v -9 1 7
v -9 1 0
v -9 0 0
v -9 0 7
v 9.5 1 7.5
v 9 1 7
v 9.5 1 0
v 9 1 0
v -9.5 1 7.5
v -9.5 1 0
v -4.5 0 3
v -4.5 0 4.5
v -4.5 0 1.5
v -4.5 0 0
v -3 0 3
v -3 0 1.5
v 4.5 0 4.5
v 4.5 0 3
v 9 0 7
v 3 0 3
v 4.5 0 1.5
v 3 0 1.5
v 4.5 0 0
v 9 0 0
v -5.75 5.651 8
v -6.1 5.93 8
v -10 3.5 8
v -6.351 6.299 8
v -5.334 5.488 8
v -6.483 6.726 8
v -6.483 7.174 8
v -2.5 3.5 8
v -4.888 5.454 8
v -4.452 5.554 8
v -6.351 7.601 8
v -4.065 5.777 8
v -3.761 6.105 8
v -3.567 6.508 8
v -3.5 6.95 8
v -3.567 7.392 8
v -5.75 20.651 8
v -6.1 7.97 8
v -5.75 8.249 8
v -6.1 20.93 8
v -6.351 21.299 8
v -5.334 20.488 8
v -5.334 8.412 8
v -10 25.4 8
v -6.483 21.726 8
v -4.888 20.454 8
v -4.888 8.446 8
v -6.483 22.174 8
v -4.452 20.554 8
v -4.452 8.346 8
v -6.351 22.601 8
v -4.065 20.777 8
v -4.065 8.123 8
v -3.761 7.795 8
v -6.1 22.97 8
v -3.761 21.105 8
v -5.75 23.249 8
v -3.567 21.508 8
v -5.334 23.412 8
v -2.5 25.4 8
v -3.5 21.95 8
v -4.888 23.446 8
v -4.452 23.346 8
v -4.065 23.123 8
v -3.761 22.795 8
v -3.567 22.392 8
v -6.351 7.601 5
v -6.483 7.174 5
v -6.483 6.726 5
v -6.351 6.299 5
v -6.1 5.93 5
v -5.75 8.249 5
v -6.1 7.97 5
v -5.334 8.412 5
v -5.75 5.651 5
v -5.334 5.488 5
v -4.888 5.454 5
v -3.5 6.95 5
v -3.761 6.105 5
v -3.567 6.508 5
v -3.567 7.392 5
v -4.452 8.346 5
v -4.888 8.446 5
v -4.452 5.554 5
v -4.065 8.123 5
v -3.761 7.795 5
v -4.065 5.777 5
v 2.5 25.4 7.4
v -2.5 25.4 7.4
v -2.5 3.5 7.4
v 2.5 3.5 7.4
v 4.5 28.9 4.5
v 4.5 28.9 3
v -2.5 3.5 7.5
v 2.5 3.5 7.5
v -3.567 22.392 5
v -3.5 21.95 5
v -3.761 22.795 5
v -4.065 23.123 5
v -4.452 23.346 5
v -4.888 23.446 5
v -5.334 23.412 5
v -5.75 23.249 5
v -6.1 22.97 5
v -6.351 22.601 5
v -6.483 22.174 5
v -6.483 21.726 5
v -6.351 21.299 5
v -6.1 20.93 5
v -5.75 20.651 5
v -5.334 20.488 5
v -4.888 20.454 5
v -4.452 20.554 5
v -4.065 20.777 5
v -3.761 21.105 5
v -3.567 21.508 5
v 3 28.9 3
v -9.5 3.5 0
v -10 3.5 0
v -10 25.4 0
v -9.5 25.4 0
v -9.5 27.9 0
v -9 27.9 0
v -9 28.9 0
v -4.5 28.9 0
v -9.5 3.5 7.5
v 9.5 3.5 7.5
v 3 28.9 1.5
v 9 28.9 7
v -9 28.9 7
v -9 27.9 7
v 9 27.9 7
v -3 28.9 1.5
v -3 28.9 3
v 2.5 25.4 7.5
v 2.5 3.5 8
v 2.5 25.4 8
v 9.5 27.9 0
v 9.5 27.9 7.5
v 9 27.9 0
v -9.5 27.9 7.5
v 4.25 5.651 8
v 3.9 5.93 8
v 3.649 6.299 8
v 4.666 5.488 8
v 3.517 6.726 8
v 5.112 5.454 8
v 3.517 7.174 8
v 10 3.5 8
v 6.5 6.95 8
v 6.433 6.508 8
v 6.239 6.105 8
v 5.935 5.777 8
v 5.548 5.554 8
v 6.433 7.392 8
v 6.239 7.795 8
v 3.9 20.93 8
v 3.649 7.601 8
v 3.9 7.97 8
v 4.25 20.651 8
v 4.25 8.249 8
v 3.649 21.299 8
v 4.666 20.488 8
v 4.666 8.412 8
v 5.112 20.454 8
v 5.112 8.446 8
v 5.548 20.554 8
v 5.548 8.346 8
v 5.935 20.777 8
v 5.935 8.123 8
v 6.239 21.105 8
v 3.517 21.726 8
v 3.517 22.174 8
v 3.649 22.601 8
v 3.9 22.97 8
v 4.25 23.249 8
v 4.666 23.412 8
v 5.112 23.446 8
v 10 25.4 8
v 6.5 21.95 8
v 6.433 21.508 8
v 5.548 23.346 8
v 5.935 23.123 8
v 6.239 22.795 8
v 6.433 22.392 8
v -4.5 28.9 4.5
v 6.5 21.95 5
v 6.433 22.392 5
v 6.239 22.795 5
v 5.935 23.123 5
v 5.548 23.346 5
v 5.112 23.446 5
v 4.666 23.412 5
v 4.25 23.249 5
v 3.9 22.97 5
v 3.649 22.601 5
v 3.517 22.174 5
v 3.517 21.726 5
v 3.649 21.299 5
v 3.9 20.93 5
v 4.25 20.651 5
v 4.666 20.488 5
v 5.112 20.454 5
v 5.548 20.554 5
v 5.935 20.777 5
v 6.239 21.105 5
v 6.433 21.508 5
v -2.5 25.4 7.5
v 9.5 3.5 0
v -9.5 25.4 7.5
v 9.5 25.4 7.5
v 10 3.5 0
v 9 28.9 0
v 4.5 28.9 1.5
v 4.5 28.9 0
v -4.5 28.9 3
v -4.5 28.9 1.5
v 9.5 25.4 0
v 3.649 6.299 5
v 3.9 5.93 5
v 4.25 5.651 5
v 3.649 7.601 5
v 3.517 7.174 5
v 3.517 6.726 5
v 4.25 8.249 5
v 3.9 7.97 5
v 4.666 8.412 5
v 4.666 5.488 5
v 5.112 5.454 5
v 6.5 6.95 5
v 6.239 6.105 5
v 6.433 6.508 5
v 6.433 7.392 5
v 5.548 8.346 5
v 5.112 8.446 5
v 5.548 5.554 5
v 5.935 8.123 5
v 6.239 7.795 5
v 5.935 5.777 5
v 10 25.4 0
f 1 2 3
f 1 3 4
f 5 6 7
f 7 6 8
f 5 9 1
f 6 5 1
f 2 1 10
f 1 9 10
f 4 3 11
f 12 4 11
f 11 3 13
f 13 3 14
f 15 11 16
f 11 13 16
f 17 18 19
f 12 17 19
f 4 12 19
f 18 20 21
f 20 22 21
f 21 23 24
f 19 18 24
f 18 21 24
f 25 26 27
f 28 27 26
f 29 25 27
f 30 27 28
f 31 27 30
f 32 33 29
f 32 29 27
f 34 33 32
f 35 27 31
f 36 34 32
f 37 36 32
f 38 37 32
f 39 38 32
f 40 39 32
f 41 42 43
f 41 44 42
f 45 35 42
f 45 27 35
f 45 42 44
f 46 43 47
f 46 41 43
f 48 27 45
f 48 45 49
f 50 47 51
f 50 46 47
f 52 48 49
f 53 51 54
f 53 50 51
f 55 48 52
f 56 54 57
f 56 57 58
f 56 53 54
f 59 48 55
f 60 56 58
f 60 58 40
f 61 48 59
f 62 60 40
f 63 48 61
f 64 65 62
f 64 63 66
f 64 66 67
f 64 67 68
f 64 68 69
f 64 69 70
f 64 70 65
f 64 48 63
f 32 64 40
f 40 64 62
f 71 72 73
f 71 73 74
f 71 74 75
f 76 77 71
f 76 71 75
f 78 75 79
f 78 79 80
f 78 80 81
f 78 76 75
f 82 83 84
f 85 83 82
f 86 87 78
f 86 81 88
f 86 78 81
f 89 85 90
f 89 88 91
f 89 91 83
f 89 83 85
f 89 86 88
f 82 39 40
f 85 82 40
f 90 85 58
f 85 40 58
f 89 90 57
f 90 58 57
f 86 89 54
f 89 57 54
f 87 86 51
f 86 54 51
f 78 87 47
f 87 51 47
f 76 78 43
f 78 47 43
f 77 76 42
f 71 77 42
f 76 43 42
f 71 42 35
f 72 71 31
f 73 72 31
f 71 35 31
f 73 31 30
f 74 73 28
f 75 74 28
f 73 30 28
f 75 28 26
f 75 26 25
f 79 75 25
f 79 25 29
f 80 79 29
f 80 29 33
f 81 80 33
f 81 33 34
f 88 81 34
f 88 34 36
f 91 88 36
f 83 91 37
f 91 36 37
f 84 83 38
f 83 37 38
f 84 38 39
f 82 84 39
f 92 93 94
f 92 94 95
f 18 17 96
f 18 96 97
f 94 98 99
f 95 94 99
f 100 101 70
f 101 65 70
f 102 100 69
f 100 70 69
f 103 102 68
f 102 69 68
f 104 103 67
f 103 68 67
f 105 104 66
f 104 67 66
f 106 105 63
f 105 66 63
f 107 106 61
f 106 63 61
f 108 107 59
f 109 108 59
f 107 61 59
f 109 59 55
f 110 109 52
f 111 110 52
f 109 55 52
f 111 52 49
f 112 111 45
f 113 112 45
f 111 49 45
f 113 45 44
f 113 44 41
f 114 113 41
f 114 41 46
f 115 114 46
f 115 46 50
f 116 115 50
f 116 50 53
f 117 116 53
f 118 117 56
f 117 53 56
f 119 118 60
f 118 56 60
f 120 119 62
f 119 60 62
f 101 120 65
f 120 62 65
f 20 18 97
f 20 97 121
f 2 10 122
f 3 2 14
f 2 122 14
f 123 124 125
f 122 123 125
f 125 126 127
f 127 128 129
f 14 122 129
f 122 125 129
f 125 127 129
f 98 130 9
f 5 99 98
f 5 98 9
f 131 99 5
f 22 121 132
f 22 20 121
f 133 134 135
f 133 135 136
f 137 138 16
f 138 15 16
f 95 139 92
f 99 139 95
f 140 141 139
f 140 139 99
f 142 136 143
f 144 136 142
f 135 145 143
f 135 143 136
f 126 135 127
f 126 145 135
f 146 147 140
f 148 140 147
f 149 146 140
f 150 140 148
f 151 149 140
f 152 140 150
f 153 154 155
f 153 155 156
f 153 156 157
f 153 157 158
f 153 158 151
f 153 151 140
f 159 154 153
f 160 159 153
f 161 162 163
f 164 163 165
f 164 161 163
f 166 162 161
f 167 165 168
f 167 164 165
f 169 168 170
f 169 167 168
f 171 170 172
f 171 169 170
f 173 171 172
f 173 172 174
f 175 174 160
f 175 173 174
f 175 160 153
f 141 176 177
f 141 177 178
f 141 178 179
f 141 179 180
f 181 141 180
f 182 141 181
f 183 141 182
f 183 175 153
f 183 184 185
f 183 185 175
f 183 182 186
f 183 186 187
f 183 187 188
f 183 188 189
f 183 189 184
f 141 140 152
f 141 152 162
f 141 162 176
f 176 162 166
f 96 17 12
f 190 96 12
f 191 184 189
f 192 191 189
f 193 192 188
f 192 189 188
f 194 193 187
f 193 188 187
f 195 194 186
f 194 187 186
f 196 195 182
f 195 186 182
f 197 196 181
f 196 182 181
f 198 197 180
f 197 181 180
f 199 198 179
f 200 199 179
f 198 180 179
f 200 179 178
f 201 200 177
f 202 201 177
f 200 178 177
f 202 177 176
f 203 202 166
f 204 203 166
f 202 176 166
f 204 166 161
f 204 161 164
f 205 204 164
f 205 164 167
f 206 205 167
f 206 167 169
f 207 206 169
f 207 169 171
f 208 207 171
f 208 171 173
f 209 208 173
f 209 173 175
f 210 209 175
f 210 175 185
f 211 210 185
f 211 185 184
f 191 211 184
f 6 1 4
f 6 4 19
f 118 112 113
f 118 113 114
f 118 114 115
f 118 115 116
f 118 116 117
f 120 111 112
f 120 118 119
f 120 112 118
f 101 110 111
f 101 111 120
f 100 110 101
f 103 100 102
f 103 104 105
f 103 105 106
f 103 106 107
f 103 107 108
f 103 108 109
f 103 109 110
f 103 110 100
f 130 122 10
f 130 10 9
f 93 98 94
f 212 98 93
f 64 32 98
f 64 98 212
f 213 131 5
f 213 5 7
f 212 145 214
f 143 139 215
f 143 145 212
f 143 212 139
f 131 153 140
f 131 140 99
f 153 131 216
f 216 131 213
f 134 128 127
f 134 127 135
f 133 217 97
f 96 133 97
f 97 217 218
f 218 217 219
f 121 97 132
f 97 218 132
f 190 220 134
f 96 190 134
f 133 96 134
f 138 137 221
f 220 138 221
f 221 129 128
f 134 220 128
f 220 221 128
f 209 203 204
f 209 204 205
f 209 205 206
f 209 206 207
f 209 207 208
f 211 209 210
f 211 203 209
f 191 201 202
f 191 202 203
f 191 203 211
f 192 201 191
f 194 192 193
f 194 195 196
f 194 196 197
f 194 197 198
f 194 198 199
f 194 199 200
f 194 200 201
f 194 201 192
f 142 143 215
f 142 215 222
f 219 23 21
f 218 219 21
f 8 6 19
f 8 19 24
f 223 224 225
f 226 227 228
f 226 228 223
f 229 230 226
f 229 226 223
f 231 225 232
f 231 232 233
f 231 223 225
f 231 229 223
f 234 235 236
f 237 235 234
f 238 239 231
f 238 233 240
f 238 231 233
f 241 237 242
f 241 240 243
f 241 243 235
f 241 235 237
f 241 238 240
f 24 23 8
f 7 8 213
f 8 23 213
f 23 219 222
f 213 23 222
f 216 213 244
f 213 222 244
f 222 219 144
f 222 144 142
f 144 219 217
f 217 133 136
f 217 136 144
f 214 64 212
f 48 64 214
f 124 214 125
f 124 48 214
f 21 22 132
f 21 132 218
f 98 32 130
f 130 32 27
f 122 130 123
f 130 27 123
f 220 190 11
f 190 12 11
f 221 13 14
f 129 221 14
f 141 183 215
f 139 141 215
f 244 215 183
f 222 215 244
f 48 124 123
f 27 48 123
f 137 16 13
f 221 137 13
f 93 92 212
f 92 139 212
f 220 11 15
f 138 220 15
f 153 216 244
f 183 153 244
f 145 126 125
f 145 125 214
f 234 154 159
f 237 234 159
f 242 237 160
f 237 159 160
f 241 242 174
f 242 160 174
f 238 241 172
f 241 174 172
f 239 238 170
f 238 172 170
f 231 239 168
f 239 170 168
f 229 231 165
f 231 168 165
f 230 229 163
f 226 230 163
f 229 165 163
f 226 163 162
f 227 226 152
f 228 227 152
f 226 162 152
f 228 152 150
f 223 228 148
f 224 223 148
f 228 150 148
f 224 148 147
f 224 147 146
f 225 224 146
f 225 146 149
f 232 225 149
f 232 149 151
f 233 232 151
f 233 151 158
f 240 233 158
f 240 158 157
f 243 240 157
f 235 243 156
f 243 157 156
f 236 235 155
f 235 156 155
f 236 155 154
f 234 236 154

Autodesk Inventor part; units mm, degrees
ref_plane "YZ Plane" through (0, 0, 0) normal (1, 0, 0) x (0, 1, 0)
ref_plane "XZ Plane" through (0, 0, 0) normal (0, 1, 0) x (-1, 0, 0)
ref_plane "XY Plane" through (0, 0, 0) normal (0, 0, 1) x (1, 0, 0)
sketch "Szkic1" plane through (0, 0, 0) normal (0, 0, 1) x (1, 0, 0)
  line L0 (0, 0) -> (10, 0)
  line L1 (10, 0) -> (10, 28.9)
  line L2 (10, 28.9) -> (-10, 28.9)
  line L3 (-10, 28.9) -> (-10, 0)
  line L4 (-10, 0) -> (10, 0)
  dimension "d1" = 28.9
  dimension "d2" = 20
extrude "Wyciągnięcie proste1" add sketch "Szkic1" along normal blind 8
sketch "Szkic2" plane through (-10, 0, 0) normal (0, -1, 0) x (1, 0, 0)
  line L0 (0, 0) -> (20, 0)
  line L1 (20, 0) -> (20, 8)
  line L2 (0, 8) -> (20, 8)
  line L3 (0, 0) -> (0, 8)
  line L4 (14.5, 4.5) -> (5.5, 4.5)
  line L5 (14.5, 4.5) -> (14.5, 3)
  line L6 (14.5, 3) -> (13, 3)
  line L7 (13, 3) -> (13, 1.5)
  line L8 (13, 1.5) -> (14.5, 1.5)
  line L9 (5.5, 4.5) -> (5.5, 3)
  line L10 (5.5, 3) -> (7, 3)
  line L11 (7, 3) -> (7, 1.5)
  line L12 (7, 1.5) -> (5.5, 1.5)
  line L13 (5.5, 4.5) -> (5.5, 3)
  line L14 (5.5, 1.5) -> (5.5, 0)
  line L15 (14.5, 0) -> (14.5, 1.5)
  line L16 (14.5, 3) -> (14.5, 4.5)
extrude "Wyciągnięcie proste2" cut sketch "Szkic2" against normal up to next contours L14 L12 L11 L10 L9 L4 L5 L6 L7 L8 L15 L0
sketch "Szkic3" plane through (0, 0, 8) normal (0, 0, 1) x (1, 0, 0)
  line L0 (10, 0) -> (10, 28.9)
  line L1 (10, 28.9) -> (-10, 28.9)
  line L2 (-10, 28.9) -> (-10, 0)
  line L3 (-10, 0) -> (10, 0)
  line L4 (10, 28.9) -> (-10, 0)
  line L5 (10, 28.9) -> (-10, 28.9)
  line L6 (10, 0) -> (-10, 28.9)
  line L7 (-10, 28.9) -> (0, 14.45)
  line L8 (0, 14.45) -> (0, 6.95)
  line L9 (0, 6.95) -> (5, 6.95)
  line L10 (5, 6.95) -> (5, 21.95)
  line L11 (3, 0) -> (3, 28.9)
  line L12 (5, 21.95) -> (-5, 21.95)
  line L13 (-5, 21.95) -> (-5, 6.95)
  line L14 (-5, 6.95) -> (0, 6.95)
  line L15 (-3, 0) -> (-3, 28.9)
  circle A0 centre (5, 21.95) radius 1.5
  circle A1 centre (5, 6.95) radius 1.5
  circle A2 centre (-5, 21.95) radius 1.5
  circle A3 centre (-5, 6.95) radius 1.5
  point P0 (0, 0)
  dimension "d23" = 10
  dimension "d24" = 15
  dimension "d25" = 3
  dimension "d26" = 3
  dimension "d27" = 3
  dimension "d28" = 3
extrude "Wyciągnięcie proste3" cut sketch "Szkic3" against normal blind 3 contours A1 L9 L10 L6 | L6 L10 A1 | A0 L10 L4 | L4 L10 L12 A0 | L10 L9 A1 L6 | L6 A1 L10 | L10 A0 L4 | L4 A0 L12 L10 | A3 L13 L4 | L4 L13 L14 A3 | L14 L13 L4 A3 | A2 L12 L13 L6 | L6 L13 A2 | A2 L6 L13 L12 | L13 A3 L4 | L6 A2 L13
thread "Gwint1" size "M3x0.5" class "6H" standard "ANSI Metric M Profile" full length
thread "Gwint2" size "M3x0.5" class "6H" standard "ANSI Metric M Profile" full length
thread "Gwint3" size "M3x0.5" class "6H" standard "ANSI Metric M Profile" full length
thread "Gwint4" size "M3x0.5" class "6H" standard "ANSI Metric M Profile" full length
sketch "Szkic4" plane through (0, 0, 8) normal (0, 0, 1) x (1, 0, 0)
  circle A0 centre (-5, 6.95) radius 1.5
  circle A1 centre (5, 6.95) radius 1.5
  circle A2 centre (5, 21.95) radius 1.5
  circle A3 centre (-5, 21.95) radius 1.5
  line L0 (10, 28.9) -> (-10, 28.9)
  line L1 (-10, 0) -> (10, 0)
  line L2 (-10, 0) -> (-10, 1)
  line L3 (-10, 1) -> (10, 1)
  line L4 (-10, 28.9) -> (-10, 27.9)
  line L5 (-10, 27.9) -> (10, 27.9)
  line L6 (-10, 28.9) -> (-10, 27.9)
  line L7 (-10, 1) -> (-10, 0)
  line L8 (10, 0) -> (10, 1)
  line L9 (10, 27.9) -> (10, 28.9)
  line L10 (10, 0) -> (10, 1)
  line L11 (10, 27.9) -> (10, 28.9)
  line L12 (-10, 28.9) -> (-10, 27.9)
  line L13 (-10, 1) -> (-10, 0)
  point P0 (0, 0)
  dimension "d39" = 1
  dimension "d40" = 1
extrude "Wyciągnięcie proste4" cut sketch "Szkic4" against normal blind 1 contours L9 L5 L4 L0 | L2 L3 L8 L1
sketch "Szkic5" plane through (10, 0, 0) normal (1, 0, 0) x (0, 0, -1)
  line L0 (-7, 1) -> (-7, 0) projected
  line L1 (0, 0) -> (-7, 0) projected
  line L2 (0, 0) -> (0, 28.9) projected
  line L3 (-7, 28.9) -> (-7, 27.9) projected
  line L4 (0, 28.9) -> (-7, 28.9) projected
  line L5 (-7, 1) -> (0, 1)
  line L6 (-7, 27.9) -> (0, 27.9)
extrude "Wyciągnięcie proste5" cut sketch "Szkic5" against normal blind 1
sketch "Szkic6" plane through (-10, 0, 0) normal (-1, 0, 0) x (0, 0, 1)
  line L0 (7, 27.9) -> (7, 28.9) projected
  line L1 (0, 28.9) -> (7, 28.9) projected
  line L2 (0, 28.9) -> (0, 0) projected
  line L3 (0, 0) -> (7, 0) projected
  line L4 (7, 0) -> (7, 1) projected
  line L5 (8, 27.9) -> (7, 27.9) projected
  line L6 (7, 27.9) -> (0, 27.9)
  line L7 (7, 1) -> (0, 1)
extrude "Wyciągnięcie proste6" cut sketch "Szkic6" against normal blind 1
sketch "Szkic7" plane through (0, 0, 8) normal (0, 0, 1) x (1, 0, 0)
  circle A0 centre (-5, 21.95) radius 1.5
  circle A1 centre (5, 21.95) radius 1.5
  circle A2 centre (5, 6.95) radius 1.5
  circle A3 centre (-5, 6.95) radius 1.5
  line L0 (-10, 1) -> (10, 1)
  line L1 (10, 27.9) -> (-10, 27.9)
  line L2 (10, 27.9) -> (10, 25.4)
  line L3 (10, 25.4) -> (-10, 25.4)
  line L4 (10, 1) -> (9, 1)
  line L5 (10, 1) -> (10, 3.5)
  line L6 (10, 3.5) -> (-10, 3.5)
  line L7 (10, 1) -> (10, 3.5)
  line L8 (10, 25.4) -> (10, 27.9)
  line L9 (10, 1) -> (10, 3.5)
  line L10 (10, 25.4) -> (10, 27.9)
  line L11 (-10, 27.9) -> (-10, 25.4)
  line L12 (-10, 3.5) -> (-10, 1)
  line L13 (-10, 27.9) -> (-10, 25.4)
  line L14 (-10, 3.5) -> (-10, 1)
  point P0 (0, 0)
  dimension "d47" = 2.5
  dimension "d48" = 2.5
extrude "Wyciągnięcie proste7" cut sketch "Szkic7" against normal blind 0.5 contours L12 L6 L5 L0 | L2 L3 L11 L1
sketch "Szkic8" plane through (-10, 1, 0) normal (-1, 0, 0) x (0, 0, 1)
  line L0 (7.5, 24.4) -> (7.5, 26.9) projected
  line L1 (7.5, 26.9) -> (0, 26.9) projected
  line L2 (7.5, 0) -> (7.5, 2.5) projected
  line L3 (0, 0) -> (7.5, 0) projected
  line L4 (0, 26.9) -> (0, 0) projected
  line L5 (7.5, 24.4) -> (0, 24.4)
  line L6 (7.5, 2.5) -> (7.5, 0) projected
  line L7 (7.5, 2.5) -> (0, 2.5)
  point P0 (0, -1)
extrude "Wyciągnięcie proste8" cut sketch "Szkic8" against normal blind 0.5
sketch "Szkic9" plane through (10, 1, 0) normal (1, 0, 0) x (0, 0, -1)
  line L0 (-7.5, 2.5) -> (-7.5, 0) projected
  line L1 (-7.5, 0) -> (0, 0) projected
  line L2 (-7.5, 26.9) -> (-7.5, 24.4) projected
  line L3 (0, 26.9) -> (-7.5, 26.9) projected
  line L4 (0, 0) -> (0, 26.9) projected
  line L5 (0, 2.5) -> (-8, 2.5) projected
  line L6 (-7.5, 2.5) -> (0, 2.5)
  line L7 (-8, 24.4) -> (0, 24.4) projected
  line L8 (-7.5, 24.4) -> (0, 24.4)
  point P0 (0, -1)
extrude "Wyciągnięcie proste9" cut sketch "Szkic9" against normal blind 0.5
sketch "Szkic10" plane through (0, 0, 8) normal (0, 0, 1) x (1, 0, 0)
  line L0 (-10, 3.5) -> (10, 3.5) projected
  line L1 (10, 3.5) -> (10, 25.4) projected
  line L2 (10, 25.4) -> (-10, 25.4) projected
  line L3 (-10, 25.4) -> (-10, 3.5) projected
  circle A0 centre (-5, 21.95) radius 1.5 projected
  circle A1 centre (5, 21.95) radius 1.5 projected
  circle A2 centre (5, 6.95) radius 1.5 projected
  circle A3 centre (-5, 6.95) radius 1.5 projected
  line L4 (0, 3.5) -> (-2.5, 3.5)
  line L5 (-9.5, 3.5) -> (9.5, 3.5) projected
  line L6 (-2.5, 3.5) -> (-2.5, 25.4)
  line L7 (10, 25.4) -> (-10, 25.4) projected
  line L8 (-2.5, 25.4) -> (2.5, 25.4)
  line L9 (2.5, 25.4) -> (2.5, 3.5)
  line L10 (0, 3.5) -> (2.5, 3.5)
  point P0 (0, 0)
  dimension "d55" = 2.5
  dimension "d56" = 5
extrude "Wyciągnięcie proste10" cut sketch "Szkic10" against normal blind 0.6 contours L6 L2 L9 L0
properties part number "Wózel MGN9C"
